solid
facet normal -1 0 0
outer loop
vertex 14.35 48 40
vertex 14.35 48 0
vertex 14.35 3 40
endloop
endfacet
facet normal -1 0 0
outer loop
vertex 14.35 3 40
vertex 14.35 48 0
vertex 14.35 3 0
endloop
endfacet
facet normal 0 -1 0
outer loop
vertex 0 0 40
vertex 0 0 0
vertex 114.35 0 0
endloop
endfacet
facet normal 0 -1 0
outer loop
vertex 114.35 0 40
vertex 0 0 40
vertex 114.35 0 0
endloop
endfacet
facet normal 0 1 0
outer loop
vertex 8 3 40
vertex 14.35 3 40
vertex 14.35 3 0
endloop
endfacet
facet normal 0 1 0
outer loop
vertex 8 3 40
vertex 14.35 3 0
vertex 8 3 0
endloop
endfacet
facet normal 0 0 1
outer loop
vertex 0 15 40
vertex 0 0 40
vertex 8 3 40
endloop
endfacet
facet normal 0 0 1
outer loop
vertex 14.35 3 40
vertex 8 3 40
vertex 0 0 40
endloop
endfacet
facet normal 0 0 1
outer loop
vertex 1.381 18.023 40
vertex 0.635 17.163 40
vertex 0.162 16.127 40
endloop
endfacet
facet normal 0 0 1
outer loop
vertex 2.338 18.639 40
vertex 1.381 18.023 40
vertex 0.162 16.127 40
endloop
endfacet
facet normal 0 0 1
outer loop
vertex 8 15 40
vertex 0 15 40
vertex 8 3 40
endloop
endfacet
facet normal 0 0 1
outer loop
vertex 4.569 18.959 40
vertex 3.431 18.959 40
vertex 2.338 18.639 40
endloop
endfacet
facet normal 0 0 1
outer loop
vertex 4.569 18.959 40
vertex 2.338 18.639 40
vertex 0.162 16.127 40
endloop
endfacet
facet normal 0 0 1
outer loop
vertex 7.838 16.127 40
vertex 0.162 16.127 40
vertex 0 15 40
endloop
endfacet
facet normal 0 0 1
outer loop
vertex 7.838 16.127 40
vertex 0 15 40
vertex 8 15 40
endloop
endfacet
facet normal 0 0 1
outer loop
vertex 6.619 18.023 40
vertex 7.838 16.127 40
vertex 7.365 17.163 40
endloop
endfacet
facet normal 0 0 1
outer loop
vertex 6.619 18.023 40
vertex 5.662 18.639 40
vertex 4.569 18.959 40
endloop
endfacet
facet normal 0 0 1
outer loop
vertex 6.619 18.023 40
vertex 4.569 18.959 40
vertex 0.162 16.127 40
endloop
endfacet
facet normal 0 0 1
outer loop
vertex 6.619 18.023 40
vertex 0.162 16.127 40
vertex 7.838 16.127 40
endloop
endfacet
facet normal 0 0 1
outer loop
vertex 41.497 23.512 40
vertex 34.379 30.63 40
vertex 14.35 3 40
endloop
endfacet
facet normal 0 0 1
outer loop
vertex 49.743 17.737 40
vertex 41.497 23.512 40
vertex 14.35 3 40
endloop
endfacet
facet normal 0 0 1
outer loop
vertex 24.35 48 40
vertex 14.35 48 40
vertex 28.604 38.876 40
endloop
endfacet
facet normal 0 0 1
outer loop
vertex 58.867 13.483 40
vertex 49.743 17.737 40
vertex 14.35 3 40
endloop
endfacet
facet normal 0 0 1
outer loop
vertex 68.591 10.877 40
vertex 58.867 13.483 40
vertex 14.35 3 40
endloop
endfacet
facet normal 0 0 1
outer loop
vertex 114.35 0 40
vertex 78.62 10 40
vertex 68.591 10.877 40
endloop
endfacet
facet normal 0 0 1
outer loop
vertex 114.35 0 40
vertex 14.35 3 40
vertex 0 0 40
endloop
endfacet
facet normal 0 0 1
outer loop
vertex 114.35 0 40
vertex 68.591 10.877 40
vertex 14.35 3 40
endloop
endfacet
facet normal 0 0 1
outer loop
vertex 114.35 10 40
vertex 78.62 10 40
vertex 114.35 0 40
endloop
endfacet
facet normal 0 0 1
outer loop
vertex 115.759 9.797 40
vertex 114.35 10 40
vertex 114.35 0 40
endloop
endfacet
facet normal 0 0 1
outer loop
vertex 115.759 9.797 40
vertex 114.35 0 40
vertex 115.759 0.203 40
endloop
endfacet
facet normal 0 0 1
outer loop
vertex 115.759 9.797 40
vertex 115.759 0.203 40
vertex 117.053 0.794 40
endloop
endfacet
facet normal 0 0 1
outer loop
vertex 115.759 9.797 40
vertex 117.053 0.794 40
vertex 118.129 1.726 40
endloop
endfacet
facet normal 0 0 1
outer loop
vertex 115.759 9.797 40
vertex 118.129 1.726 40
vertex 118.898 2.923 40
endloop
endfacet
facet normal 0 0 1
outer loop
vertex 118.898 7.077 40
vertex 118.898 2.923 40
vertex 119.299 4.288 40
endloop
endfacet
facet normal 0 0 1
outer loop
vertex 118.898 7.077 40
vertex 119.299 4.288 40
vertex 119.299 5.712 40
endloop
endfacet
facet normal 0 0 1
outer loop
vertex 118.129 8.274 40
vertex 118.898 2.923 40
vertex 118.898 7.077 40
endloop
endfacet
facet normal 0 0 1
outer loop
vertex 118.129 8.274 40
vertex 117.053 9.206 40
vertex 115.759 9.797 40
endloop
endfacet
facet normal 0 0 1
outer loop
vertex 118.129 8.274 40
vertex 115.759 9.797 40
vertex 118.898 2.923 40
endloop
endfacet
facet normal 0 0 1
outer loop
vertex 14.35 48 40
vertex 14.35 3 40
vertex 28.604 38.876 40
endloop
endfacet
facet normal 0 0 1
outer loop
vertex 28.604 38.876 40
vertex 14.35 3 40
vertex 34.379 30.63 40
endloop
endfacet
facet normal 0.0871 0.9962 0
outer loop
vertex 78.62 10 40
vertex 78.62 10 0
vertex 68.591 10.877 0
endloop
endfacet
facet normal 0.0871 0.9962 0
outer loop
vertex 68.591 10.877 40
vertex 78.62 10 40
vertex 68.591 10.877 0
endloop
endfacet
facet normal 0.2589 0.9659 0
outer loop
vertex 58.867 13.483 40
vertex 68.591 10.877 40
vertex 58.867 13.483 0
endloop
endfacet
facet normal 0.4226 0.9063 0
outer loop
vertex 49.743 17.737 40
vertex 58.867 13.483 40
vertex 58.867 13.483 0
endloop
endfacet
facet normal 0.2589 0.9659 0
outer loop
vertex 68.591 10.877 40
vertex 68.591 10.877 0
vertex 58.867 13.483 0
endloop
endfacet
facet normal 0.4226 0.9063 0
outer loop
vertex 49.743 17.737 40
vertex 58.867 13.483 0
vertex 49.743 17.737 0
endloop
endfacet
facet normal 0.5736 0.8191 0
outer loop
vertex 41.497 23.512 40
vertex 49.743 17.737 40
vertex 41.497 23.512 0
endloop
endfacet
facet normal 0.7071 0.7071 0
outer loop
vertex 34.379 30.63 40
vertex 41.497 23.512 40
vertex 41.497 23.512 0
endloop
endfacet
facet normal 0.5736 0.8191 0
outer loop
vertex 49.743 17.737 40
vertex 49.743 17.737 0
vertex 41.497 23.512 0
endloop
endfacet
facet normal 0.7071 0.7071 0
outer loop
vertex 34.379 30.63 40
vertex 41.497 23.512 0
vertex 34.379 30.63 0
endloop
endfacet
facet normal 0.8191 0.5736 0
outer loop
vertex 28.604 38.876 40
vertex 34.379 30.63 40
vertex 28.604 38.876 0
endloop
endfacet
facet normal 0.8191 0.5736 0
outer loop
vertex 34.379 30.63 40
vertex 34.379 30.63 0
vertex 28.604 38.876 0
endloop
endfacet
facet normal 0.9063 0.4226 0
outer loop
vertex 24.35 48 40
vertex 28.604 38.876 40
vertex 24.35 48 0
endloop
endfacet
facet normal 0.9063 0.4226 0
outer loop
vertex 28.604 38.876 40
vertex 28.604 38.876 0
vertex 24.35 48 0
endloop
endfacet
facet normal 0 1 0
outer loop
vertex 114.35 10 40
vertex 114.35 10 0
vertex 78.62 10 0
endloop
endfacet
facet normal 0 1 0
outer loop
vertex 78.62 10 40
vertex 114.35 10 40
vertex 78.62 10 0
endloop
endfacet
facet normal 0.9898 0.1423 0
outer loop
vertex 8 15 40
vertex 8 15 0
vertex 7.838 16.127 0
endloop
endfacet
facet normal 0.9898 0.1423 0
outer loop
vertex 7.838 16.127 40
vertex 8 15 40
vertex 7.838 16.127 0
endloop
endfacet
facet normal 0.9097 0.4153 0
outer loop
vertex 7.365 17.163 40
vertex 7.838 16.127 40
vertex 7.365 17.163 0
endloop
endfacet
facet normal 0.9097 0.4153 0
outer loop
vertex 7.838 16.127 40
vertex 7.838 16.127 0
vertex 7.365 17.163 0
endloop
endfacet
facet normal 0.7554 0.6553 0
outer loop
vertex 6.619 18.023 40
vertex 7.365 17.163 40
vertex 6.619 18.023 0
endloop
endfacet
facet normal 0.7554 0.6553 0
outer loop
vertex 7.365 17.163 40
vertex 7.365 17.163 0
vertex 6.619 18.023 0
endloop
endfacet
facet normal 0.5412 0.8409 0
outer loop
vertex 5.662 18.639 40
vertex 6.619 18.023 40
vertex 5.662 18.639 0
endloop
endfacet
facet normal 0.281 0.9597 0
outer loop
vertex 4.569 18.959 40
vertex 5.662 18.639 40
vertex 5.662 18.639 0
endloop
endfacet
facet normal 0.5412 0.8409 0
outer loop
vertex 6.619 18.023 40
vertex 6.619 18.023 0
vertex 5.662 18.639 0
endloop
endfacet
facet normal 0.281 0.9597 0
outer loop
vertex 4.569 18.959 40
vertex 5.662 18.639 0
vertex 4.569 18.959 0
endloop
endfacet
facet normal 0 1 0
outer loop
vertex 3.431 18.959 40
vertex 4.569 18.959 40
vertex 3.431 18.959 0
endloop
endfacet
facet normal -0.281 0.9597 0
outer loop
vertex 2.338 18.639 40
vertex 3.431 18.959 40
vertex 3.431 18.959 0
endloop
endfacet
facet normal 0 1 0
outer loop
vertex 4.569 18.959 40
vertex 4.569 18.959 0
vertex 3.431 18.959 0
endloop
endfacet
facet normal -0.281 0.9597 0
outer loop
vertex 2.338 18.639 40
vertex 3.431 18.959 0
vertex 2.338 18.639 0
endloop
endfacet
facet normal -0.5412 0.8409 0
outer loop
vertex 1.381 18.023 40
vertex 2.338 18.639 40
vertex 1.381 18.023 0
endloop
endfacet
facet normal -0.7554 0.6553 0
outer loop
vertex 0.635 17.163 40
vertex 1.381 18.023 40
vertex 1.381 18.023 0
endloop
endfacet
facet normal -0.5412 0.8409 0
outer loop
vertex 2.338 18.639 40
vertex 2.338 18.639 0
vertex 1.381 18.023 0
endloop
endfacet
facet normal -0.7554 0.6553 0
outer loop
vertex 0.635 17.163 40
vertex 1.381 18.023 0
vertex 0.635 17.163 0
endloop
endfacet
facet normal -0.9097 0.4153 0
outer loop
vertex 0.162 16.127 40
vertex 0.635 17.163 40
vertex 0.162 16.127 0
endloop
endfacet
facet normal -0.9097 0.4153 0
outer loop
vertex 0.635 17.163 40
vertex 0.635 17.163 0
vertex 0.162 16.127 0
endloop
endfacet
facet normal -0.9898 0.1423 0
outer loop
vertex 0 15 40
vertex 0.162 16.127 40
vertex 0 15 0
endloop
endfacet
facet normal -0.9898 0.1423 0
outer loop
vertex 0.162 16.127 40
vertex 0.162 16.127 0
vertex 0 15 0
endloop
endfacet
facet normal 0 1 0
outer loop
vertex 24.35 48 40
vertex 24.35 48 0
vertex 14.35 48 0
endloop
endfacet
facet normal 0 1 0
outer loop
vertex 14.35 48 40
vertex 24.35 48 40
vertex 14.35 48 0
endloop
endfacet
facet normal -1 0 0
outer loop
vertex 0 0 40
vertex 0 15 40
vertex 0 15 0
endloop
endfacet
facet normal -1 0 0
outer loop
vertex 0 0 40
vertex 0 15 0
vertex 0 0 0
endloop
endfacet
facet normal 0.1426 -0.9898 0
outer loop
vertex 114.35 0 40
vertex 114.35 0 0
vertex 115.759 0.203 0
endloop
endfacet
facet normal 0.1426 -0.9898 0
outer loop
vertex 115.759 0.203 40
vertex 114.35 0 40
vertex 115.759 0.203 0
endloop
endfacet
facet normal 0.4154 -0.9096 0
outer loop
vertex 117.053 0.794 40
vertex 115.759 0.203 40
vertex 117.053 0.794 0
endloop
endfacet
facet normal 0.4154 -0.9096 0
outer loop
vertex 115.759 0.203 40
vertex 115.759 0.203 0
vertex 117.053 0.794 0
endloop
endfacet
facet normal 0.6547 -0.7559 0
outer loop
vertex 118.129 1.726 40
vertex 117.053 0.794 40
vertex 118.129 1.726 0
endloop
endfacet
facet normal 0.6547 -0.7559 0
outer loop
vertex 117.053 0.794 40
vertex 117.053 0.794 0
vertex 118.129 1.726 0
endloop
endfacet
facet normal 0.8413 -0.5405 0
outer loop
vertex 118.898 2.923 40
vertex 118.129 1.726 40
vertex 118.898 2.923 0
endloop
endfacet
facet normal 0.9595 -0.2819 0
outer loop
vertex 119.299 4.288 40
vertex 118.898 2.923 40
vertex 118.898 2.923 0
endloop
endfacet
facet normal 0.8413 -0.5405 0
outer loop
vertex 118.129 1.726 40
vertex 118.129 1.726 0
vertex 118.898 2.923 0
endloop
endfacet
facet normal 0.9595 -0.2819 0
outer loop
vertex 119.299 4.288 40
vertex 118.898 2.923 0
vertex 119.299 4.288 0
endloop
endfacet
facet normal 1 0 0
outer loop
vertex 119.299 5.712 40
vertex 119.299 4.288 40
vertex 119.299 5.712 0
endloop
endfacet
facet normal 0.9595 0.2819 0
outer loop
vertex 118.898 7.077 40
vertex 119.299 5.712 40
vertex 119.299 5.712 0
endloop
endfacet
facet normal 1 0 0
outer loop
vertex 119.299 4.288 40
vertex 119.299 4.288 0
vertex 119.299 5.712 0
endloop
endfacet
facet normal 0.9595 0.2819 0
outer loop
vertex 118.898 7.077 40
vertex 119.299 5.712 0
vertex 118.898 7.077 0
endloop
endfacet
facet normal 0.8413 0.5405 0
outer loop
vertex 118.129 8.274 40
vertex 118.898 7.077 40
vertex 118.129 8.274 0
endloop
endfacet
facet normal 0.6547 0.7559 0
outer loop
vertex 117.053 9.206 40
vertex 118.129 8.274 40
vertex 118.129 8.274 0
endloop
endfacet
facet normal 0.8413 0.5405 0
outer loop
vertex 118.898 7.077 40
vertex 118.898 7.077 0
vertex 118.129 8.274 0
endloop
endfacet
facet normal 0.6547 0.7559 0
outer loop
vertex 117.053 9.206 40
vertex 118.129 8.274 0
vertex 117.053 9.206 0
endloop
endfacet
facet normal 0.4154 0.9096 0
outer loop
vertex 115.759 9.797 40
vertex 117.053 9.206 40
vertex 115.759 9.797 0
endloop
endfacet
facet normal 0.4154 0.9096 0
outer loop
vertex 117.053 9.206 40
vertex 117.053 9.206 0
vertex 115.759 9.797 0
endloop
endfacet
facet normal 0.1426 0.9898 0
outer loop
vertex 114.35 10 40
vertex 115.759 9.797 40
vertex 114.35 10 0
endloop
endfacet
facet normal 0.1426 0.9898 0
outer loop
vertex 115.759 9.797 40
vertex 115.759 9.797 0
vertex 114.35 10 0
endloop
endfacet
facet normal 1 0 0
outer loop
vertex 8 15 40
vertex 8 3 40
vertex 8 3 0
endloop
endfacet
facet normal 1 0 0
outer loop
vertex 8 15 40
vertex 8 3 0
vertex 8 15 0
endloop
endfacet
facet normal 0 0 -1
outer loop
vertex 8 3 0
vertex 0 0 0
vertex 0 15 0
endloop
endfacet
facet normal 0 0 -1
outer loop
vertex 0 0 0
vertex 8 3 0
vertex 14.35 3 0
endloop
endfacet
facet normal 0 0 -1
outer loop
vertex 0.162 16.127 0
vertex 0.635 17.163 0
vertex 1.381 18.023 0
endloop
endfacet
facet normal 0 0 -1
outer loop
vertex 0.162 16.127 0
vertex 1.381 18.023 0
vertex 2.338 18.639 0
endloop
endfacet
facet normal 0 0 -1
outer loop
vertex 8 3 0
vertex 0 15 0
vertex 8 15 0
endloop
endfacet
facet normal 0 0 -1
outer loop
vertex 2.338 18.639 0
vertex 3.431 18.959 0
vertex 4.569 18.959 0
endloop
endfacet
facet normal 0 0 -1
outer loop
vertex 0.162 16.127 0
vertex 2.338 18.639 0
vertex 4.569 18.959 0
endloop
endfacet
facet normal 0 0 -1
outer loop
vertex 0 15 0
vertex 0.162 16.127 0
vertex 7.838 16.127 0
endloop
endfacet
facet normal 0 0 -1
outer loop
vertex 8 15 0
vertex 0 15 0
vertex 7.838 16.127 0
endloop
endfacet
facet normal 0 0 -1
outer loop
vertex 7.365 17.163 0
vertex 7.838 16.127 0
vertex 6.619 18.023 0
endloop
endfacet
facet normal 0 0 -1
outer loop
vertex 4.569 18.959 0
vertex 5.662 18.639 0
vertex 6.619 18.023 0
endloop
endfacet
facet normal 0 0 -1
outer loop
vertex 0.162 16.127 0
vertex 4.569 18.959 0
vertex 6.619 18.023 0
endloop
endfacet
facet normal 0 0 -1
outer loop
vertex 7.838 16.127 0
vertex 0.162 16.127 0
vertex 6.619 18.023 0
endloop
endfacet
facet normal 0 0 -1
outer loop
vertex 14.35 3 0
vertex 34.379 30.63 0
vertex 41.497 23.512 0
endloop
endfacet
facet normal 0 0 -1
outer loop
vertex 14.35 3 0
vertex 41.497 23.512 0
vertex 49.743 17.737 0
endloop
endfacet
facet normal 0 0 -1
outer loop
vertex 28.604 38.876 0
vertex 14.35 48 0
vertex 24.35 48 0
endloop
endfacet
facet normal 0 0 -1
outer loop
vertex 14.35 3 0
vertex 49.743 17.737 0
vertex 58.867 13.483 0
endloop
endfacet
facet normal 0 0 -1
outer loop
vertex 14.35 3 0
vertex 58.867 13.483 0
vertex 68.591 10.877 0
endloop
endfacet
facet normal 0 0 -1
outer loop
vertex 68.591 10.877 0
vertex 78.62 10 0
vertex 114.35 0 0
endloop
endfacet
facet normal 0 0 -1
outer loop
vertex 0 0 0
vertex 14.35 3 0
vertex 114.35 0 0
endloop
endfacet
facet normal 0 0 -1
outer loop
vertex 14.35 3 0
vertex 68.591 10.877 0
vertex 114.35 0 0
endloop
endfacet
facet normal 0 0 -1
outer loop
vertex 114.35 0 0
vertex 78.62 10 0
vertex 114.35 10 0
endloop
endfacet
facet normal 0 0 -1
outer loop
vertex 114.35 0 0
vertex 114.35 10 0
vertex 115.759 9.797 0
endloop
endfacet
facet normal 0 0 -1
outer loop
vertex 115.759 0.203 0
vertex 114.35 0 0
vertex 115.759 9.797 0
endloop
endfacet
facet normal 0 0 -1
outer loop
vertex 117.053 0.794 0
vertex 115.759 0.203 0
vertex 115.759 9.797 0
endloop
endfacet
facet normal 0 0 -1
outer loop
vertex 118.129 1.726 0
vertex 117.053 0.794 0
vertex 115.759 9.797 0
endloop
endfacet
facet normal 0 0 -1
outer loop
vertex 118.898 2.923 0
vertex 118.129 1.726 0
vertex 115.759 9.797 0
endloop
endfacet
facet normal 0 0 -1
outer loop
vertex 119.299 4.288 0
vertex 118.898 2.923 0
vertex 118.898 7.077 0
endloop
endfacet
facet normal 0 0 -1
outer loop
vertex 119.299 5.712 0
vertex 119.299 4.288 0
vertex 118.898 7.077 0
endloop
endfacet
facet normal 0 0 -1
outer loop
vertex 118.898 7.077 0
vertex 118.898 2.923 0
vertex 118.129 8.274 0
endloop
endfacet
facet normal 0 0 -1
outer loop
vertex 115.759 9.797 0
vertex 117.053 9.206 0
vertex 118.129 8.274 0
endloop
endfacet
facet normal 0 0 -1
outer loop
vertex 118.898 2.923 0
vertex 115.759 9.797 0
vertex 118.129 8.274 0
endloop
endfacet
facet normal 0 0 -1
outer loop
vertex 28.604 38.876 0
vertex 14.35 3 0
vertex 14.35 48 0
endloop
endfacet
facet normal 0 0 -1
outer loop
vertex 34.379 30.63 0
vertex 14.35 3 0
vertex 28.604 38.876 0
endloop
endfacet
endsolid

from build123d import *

# Parameters (mm, degrees)
BOSS_EXTRUDE1_DEPTH = 40


with BuildPart() as part:
    # Sketch1 → Boss-Extrude1 (new body)
    with BuildSketch(Plane.XY):
        with BuildLine():
            Line((0, 15), (0, 0))
            Line((0, 0), (114.35, 0))
            ThreePointArc((114.35, 0), (119.35, 5), (114.35, 10))
            Line((114.35, 10), (78.619624256, 10))
            ThreePointArc((78.619624256, 10), (45.494135139, 20.4444266), (24.35, 48))
            Line((24.35, 48), (14.35, 48))
            Line((14.35, 48), (14.35, 3))
            Line((14.35, 3), (8, 3))
            Line((8, 3), (8, 15))
            ThreePointArc((8, 15), (4, 19), (0, 15))
        make_face()
    extrude(amount=BOSS_EXTRUDE1_DEPTH)


solid = part.part
